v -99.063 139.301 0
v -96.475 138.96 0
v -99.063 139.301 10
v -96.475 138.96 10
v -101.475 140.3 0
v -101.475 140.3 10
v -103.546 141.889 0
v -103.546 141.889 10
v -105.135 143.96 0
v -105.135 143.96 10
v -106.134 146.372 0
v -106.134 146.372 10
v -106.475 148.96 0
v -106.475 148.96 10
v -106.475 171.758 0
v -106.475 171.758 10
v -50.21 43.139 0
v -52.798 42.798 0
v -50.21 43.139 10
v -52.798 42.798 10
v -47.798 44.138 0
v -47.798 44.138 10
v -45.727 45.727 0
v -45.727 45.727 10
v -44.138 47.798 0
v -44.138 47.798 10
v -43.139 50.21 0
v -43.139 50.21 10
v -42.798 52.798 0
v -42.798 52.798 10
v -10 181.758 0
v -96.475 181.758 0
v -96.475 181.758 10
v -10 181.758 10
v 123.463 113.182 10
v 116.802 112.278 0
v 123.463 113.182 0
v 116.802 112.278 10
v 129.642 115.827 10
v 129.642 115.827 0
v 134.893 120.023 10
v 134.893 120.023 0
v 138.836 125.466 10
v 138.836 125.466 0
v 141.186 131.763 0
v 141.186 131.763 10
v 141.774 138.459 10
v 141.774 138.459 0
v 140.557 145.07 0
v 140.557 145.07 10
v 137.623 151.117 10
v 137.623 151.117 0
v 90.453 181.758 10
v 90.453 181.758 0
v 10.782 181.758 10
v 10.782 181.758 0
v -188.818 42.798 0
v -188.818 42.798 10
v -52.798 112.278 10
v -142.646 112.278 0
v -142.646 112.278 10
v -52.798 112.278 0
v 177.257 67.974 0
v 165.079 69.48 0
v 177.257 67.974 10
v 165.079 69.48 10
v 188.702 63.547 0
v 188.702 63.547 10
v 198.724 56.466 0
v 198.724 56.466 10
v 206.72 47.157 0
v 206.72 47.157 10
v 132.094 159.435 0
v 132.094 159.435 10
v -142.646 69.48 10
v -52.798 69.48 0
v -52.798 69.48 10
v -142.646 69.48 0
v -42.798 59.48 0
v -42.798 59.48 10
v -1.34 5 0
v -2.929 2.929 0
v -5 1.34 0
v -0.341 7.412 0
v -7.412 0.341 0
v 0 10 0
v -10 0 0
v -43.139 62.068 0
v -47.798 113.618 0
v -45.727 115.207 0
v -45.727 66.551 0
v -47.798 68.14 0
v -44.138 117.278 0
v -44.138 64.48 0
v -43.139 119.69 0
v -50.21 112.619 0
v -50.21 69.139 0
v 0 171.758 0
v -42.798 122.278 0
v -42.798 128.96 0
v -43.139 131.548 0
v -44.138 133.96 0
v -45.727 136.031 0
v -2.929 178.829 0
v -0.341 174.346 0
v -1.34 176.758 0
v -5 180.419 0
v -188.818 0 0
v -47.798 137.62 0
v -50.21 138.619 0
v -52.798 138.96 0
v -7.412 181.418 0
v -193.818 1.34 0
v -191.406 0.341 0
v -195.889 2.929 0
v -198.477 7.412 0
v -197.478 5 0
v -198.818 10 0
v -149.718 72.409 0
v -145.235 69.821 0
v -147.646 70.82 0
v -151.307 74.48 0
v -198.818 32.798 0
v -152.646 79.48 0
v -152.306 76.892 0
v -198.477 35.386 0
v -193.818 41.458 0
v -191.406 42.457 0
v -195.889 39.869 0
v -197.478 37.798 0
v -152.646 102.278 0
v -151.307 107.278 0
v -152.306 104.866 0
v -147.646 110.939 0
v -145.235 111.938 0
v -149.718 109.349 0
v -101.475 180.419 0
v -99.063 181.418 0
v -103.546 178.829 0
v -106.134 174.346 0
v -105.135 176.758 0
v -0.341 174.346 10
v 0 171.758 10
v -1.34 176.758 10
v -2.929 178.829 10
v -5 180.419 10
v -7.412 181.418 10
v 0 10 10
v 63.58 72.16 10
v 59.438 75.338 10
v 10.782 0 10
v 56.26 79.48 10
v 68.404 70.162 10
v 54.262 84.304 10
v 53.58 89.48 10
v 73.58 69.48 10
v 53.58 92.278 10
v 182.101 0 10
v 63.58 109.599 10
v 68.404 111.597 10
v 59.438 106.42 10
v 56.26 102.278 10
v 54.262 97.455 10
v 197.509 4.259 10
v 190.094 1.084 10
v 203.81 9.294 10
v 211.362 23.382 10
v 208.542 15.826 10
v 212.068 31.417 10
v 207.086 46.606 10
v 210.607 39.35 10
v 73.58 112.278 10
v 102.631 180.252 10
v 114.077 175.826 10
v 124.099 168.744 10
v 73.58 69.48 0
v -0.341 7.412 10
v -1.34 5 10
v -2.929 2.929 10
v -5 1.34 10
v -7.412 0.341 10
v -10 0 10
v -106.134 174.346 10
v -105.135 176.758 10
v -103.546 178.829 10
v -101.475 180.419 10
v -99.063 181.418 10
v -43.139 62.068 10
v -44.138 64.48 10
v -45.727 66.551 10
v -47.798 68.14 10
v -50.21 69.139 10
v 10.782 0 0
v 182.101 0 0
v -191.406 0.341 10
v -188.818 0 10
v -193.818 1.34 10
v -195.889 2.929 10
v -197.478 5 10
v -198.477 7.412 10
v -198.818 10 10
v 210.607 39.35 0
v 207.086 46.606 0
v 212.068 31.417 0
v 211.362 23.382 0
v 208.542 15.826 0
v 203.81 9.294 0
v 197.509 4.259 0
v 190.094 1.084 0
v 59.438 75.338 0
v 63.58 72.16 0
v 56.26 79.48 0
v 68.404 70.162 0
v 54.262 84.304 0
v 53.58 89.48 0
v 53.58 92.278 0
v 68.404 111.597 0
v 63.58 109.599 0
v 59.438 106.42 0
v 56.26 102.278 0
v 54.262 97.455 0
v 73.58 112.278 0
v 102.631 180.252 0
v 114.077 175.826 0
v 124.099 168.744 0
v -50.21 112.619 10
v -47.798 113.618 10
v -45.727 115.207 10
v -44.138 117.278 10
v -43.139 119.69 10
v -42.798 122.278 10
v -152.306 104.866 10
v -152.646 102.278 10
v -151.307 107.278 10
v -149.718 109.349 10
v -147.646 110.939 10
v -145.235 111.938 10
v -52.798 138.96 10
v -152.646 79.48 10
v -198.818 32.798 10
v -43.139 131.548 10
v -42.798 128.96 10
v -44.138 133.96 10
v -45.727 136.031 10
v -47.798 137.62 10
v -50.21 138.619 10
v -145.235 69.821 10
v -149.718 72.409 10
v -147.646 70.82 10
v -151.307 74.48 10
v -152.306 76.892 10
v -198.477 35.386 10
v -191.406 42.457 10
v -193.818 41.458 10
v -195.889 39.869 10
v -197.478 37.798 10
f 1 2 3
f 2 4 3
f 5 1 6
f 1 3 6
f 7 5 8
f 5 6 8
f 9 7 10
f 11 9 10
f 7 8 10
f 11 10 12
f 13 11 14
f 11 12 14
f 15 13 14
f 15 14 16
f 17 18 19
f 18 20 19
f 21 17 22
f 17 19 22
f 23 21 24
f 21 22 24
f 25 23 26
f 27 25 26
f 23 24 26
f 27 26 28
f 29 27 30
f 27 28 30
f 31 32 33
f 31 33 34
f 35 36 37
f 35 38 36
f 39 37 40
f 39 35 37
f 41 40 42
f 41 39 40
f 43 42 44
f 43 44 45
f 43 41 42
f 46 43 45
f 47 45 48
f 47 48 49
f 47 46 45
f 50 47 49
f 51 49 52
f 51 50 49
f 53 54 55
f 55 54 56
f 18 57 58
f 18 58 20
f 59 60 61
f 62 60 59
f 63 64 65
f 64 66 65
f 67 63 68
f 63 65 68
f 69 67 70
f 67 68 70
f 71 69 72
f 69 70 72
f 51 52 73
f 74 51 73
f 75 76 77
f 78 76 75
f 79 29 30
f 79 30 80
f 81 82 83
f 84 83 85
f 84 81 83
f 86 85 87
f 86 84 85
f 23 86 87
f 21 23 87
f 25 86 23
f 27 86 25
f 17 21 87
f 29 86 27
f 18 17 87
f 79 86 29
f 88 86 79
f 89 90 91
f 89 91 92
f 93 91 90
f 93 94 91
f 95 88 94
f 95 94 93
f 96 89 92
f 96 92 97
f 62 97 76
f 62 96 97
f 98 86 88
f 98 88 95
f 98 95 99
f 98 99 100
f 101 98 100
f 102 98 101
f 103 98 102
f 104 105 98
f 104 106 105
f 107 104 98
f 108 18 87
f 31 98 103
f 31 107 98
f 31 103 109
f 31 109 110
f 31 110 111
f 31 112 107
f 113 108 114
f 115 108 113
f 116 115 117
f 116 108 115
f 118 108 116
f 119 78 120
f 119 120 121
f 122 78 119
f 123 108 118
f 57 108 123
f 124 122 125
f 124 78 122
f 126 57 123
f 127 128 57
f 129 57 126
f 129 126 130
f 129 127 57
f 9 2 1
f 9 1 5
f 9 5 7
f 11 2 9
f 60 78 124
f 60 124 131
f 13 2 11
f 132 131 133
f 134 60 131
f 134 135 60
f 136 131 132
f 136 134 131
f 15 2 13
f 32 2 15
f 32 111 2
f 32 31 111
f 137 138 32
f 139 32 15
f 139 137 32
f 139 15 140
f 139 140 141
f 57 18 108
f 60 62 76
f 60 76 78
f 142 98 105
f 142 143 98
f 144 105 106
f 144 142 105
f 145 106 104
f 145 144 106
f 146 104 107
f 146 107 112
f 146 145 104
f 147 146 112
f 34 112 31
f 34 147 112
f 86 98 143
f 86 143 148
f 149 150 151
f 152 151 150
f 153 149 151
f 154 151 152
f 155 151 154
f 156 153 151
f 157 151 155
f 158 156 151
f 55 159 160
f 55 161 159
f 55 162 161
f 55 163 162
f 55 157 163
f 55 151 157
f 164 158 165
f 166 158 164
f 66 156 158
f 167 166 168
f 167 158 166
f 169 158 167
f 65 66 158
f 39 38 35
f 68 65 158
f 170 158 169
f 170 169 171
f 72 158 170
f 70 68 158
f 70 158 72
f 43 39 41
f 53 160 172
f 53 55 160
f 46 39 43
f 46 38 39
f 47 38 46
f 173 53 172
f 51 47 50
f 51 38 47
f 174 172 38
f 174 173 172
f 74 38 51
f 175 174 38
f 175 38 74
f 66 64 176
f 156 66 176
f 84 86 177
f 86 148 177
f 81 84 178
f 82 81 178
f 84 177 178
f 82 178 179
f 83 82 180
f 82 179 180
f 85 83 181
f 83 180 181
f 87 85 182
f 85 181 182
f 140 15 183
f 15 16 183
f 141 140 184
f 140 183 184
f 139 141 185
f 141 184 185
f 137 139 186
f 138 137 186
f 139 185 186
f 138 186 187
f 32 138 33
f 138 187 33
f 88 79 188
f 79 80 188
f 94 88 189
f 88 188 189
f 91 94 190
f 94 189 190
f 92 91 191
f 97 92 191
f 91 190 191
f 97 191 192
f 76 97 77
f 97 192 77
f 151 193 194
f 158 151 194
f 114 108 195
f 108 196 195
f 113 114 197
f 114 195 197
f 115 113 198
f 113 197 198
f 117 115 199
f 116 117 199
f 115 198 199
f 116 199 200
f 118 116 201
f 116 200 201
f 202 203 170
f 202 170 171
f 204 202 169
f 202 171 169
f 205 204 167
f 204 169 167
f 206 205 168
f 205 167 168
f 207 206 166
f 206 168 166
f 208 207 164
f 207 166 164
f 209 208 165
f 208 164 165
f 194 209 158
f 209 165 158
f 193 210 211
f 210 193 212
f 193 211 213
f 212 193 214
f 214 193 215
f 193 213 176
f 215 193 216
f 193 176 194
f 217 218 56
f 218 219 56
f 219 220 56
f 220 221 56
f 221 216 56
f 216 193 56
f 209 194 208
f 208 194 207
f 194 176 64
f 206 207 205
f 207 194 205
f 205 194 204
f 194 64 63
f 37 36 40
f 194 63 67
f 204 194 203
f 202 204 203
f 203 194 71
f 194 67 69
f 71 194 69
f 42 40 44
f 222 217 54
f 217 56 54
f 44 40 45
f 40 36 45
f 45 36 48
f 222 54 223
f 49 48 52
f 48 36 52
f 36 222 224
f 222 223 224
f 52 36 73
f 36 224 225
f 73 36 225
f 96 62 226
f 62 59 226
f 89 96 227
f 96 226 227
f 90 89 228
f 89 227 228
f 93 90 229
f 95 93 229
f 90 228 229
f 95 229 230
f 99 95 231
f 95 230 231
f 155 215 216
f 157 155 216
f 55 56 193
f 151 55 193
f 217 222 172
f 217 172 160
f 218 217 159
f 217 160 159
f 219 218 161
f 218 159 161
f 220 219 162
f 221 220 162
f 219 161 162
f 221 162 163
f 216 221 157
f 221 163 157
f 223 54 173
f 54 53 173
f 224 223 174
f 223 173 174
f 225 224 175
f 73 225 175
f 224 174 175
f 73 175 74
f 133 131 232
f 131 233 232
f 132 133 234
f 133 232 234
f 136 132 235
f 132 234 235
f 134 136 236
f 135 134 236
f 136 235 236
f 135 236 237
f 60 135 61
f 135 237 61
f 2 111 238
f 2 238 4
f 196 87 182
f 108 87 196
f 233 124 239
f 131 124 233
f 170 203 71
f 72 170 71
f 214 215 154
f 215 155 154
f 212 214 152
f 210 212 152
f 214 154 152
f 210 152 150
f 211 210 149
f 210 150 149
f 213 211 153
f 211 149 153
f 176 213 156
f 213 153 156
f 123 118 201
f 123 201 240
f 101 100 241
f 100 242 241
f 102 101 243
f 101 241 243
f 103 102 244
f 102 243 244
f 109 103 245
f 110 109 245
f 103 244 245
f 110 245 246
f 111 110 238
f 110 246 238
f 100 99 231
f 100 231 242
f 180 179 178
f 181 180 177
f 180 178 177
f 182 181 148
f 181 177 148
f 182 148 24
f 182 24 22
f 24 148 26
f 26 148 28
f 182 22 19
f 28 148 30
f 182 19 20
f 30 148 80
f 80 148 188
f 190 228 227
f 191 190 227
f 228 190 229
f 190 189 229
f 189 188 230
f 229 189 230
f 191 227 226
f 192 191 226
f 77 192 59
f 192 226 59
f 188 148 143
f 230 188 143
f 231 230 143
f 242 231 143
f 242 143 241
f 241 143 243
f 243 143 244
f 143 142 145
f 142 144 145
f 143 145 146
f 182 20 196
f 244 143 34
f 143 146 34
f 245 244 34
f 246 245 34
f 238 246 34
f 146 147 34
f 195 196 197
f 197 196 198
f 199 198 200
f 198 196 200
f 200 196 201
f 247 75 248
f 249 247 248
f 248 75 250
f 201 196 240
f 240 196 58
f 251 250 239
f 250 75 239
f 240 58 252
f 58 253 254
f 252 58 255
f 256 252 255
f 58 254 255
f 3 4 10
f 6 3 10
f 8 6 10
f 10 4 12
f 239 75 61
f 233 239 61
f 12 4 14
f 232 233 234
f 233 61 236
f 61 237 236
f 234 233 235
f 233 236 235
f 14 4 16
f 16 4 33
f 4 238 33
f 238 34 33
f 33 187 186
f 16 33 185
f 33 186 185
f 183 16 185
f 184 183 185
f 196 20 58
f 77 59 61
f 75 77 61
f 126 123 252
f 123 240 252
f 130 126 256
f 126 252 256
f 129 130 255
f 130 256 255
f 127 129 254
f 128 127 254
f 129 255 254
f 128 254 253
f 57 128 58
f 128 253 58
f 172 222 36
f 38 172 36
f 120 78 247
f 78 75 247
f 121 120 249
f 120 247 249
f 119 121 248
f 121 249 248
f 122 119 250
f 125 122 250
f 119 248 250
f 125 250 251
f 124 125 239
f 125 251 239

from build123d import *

# Parameters (mm, degrees)
BOSS_EXTRU_1_DEPTH   = 10
BOSS_EXTRU_1_2_DEPTH = 10
CONG_1_R             = 10
CONG_2_R             = 25
CONG_3_R             = 50
CONG_4_R             = 30
CONG_5_R             = 50
CONG_6_R             = 20


with BuildPart() as part:
    # Esquisse1 → Boss.-Extru.1 (new body)
    with BuildSketch(Plane.XY):
        Polygon((0, 181.758294068), (0, 0), (-198.818031305, 0), (-198.818031305, 42.798234664), (-42.798234664, 42.798234664), (-42.798234664, 69.480029702), (-152.64648987, 69.480029702), (-152.64648987, 112.278264366), (-42.798234664, 112.278264366), (-42.798234664, 138.960059404), (-106.474948435, 138.960059404), (-106.474948435, 181.758294068), align=None)
    extrude(amount=BOSS_EXTRU_1_DEPTH)

    # Congé1
    cong_1_edges = [part.edges().sort_by_distance(p)[0] for p in [
        (0, 181.758294068, 5),
        (0, 0, 5),
        (-198.818031305, 0, 5),
        (-198.818031305, 42.798234664, 5),
        (-42.798234664, 42.798234664, 5),
        (-42.798234664, 69.480029702, 5),
        (-152.64648987, 69.480029702, 5),
        (-152.64648987, 112.278264366, 5),
        (-42.798234664, 112.278264366, 5),
        (-42.798234664, 138.960059404, 5),
        (-106.474948435, 138.960059404, 5),
        (-106.474948435, 181.758294068, 5),
    ]]
    fillet(cong_1_edges, radius=CONG_1_R)


with BuildPart() as body_2:
    # Esquisse1 → Boss.-Extru.1 2 (new body)
    with BuildSketch(Plane.XY):
        Polygon((10.782047663, 181.758294068), (10.782047663, 0), (238.062649315, 0), (191.882746402, 69.480029702), (53.580282327, 69.480029702), (53.580282327, 112.278264366), (163.436899011, 112.278264366), (117.256996099, 181.758294068), align=None)
    extrude(amount=BOSS_EXTRU_1_2_DEPTH)

    # Congé2
    cong_2_edges = [body_2.edges().sort_by_distance(p)[0] for p in [
        (163.436899011, 112.278264366, 5),
    ]]
    fillet(cong_2_edges, radius=CONG_2_R)

    # Congé3
    cong_3_edges = [body_2.edges().sort_by_distance(p)[0] for p in [
        (191.882746402, 69.480029702, 5),
    ]]
    fillet(cong_3_edges, radius=CONG_3_R)

    # Congé4
    cong_4_edges = [body_2.edges().sort_by_distance(p)[0] for p in [
        (238.062649315, 0, 5),
    ]]
    fillet(cong_4_edges, radius=CONG_4_R)

    # Congé5
    cong_5_edges = [body_2.edges().sort_by_distance(p)[0] for p in [
        (117.256996099, 181.758294068, 5),
    ]]
    fillet(cong_5_edges, radius=CONG_5_R)

    # Congé6
    cong_6_edges = [body_2.edges().sort_by_distance(p)[0] for p in [
        (53.580282327, 112.278264366, 5),
        (53.580282327, 69.480029702, 5),
    ]]
    fillet(cong_6_edges, radius=CONG_6_R)


solid = Compound([part.part, body_2.part])
